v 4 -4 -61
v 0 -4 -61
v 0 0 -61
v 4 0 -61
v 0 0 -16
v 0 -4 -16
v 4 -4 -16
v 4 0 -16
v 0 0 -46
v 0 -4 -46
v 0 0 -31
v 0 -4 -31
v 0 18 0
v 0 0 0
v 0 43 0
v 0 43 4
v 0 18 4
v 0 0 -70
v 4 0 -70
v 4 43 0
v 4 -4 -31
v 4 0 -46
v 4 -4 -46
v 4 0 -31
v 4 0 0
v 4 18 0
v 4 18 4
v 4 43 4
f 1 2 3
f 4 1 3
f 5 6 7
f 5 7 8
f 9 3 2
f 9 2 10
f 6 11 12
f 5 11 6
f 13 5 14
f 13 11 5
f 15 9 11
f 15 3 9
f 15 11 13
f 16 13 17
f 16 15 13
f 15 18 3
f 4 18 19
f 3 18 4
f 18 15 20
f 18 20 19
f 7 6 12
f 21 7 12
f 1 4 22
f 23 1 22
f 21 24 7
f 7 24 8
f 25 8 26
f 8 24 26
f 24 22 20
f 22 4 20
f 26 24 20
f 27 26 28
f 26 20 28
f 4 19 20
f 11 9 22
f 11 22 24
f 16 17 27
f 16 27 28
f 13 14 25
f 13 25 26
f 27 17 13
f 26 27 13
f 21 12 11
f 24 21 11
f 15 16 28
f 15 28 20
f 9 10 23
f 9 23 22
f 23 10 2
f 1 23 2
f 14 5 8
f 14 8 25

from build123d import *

# Parameters (mm, degrees)
SKETCH1_W           = 15
SKETCH1_H           = 4
SKETCH1_W_2         = 4
SKETCH1_H_2         = 25
BOSS_EXTRUDE1_DEPTH = 4


with BuildPart() as part:
    # Sketch1 → Boss-Extrude1 (new body)
    with BuildSketch(Plane(origin=(0, 0, 0), x_dir=(0, 0, -1), z_dir=(1, 0, 0))):
        Polygon((70, 0), (0, 0), (0, 43), align=None)
        with Locations((53.5, -2)):
            Rectangle(SKETCH1_W, SKETCH1_H)
        with Locations((23.5, -2)):
            Rectangle(SKETCH1_W, SKETCH1_H)
        with Locations((-2, 30.5)):
            Rectangle(SKETCH1_W_2, SKETCH1_H_2)
    extrude(amount=BOSS_EXTRUDE1_DEPTH)


solid = part.part
